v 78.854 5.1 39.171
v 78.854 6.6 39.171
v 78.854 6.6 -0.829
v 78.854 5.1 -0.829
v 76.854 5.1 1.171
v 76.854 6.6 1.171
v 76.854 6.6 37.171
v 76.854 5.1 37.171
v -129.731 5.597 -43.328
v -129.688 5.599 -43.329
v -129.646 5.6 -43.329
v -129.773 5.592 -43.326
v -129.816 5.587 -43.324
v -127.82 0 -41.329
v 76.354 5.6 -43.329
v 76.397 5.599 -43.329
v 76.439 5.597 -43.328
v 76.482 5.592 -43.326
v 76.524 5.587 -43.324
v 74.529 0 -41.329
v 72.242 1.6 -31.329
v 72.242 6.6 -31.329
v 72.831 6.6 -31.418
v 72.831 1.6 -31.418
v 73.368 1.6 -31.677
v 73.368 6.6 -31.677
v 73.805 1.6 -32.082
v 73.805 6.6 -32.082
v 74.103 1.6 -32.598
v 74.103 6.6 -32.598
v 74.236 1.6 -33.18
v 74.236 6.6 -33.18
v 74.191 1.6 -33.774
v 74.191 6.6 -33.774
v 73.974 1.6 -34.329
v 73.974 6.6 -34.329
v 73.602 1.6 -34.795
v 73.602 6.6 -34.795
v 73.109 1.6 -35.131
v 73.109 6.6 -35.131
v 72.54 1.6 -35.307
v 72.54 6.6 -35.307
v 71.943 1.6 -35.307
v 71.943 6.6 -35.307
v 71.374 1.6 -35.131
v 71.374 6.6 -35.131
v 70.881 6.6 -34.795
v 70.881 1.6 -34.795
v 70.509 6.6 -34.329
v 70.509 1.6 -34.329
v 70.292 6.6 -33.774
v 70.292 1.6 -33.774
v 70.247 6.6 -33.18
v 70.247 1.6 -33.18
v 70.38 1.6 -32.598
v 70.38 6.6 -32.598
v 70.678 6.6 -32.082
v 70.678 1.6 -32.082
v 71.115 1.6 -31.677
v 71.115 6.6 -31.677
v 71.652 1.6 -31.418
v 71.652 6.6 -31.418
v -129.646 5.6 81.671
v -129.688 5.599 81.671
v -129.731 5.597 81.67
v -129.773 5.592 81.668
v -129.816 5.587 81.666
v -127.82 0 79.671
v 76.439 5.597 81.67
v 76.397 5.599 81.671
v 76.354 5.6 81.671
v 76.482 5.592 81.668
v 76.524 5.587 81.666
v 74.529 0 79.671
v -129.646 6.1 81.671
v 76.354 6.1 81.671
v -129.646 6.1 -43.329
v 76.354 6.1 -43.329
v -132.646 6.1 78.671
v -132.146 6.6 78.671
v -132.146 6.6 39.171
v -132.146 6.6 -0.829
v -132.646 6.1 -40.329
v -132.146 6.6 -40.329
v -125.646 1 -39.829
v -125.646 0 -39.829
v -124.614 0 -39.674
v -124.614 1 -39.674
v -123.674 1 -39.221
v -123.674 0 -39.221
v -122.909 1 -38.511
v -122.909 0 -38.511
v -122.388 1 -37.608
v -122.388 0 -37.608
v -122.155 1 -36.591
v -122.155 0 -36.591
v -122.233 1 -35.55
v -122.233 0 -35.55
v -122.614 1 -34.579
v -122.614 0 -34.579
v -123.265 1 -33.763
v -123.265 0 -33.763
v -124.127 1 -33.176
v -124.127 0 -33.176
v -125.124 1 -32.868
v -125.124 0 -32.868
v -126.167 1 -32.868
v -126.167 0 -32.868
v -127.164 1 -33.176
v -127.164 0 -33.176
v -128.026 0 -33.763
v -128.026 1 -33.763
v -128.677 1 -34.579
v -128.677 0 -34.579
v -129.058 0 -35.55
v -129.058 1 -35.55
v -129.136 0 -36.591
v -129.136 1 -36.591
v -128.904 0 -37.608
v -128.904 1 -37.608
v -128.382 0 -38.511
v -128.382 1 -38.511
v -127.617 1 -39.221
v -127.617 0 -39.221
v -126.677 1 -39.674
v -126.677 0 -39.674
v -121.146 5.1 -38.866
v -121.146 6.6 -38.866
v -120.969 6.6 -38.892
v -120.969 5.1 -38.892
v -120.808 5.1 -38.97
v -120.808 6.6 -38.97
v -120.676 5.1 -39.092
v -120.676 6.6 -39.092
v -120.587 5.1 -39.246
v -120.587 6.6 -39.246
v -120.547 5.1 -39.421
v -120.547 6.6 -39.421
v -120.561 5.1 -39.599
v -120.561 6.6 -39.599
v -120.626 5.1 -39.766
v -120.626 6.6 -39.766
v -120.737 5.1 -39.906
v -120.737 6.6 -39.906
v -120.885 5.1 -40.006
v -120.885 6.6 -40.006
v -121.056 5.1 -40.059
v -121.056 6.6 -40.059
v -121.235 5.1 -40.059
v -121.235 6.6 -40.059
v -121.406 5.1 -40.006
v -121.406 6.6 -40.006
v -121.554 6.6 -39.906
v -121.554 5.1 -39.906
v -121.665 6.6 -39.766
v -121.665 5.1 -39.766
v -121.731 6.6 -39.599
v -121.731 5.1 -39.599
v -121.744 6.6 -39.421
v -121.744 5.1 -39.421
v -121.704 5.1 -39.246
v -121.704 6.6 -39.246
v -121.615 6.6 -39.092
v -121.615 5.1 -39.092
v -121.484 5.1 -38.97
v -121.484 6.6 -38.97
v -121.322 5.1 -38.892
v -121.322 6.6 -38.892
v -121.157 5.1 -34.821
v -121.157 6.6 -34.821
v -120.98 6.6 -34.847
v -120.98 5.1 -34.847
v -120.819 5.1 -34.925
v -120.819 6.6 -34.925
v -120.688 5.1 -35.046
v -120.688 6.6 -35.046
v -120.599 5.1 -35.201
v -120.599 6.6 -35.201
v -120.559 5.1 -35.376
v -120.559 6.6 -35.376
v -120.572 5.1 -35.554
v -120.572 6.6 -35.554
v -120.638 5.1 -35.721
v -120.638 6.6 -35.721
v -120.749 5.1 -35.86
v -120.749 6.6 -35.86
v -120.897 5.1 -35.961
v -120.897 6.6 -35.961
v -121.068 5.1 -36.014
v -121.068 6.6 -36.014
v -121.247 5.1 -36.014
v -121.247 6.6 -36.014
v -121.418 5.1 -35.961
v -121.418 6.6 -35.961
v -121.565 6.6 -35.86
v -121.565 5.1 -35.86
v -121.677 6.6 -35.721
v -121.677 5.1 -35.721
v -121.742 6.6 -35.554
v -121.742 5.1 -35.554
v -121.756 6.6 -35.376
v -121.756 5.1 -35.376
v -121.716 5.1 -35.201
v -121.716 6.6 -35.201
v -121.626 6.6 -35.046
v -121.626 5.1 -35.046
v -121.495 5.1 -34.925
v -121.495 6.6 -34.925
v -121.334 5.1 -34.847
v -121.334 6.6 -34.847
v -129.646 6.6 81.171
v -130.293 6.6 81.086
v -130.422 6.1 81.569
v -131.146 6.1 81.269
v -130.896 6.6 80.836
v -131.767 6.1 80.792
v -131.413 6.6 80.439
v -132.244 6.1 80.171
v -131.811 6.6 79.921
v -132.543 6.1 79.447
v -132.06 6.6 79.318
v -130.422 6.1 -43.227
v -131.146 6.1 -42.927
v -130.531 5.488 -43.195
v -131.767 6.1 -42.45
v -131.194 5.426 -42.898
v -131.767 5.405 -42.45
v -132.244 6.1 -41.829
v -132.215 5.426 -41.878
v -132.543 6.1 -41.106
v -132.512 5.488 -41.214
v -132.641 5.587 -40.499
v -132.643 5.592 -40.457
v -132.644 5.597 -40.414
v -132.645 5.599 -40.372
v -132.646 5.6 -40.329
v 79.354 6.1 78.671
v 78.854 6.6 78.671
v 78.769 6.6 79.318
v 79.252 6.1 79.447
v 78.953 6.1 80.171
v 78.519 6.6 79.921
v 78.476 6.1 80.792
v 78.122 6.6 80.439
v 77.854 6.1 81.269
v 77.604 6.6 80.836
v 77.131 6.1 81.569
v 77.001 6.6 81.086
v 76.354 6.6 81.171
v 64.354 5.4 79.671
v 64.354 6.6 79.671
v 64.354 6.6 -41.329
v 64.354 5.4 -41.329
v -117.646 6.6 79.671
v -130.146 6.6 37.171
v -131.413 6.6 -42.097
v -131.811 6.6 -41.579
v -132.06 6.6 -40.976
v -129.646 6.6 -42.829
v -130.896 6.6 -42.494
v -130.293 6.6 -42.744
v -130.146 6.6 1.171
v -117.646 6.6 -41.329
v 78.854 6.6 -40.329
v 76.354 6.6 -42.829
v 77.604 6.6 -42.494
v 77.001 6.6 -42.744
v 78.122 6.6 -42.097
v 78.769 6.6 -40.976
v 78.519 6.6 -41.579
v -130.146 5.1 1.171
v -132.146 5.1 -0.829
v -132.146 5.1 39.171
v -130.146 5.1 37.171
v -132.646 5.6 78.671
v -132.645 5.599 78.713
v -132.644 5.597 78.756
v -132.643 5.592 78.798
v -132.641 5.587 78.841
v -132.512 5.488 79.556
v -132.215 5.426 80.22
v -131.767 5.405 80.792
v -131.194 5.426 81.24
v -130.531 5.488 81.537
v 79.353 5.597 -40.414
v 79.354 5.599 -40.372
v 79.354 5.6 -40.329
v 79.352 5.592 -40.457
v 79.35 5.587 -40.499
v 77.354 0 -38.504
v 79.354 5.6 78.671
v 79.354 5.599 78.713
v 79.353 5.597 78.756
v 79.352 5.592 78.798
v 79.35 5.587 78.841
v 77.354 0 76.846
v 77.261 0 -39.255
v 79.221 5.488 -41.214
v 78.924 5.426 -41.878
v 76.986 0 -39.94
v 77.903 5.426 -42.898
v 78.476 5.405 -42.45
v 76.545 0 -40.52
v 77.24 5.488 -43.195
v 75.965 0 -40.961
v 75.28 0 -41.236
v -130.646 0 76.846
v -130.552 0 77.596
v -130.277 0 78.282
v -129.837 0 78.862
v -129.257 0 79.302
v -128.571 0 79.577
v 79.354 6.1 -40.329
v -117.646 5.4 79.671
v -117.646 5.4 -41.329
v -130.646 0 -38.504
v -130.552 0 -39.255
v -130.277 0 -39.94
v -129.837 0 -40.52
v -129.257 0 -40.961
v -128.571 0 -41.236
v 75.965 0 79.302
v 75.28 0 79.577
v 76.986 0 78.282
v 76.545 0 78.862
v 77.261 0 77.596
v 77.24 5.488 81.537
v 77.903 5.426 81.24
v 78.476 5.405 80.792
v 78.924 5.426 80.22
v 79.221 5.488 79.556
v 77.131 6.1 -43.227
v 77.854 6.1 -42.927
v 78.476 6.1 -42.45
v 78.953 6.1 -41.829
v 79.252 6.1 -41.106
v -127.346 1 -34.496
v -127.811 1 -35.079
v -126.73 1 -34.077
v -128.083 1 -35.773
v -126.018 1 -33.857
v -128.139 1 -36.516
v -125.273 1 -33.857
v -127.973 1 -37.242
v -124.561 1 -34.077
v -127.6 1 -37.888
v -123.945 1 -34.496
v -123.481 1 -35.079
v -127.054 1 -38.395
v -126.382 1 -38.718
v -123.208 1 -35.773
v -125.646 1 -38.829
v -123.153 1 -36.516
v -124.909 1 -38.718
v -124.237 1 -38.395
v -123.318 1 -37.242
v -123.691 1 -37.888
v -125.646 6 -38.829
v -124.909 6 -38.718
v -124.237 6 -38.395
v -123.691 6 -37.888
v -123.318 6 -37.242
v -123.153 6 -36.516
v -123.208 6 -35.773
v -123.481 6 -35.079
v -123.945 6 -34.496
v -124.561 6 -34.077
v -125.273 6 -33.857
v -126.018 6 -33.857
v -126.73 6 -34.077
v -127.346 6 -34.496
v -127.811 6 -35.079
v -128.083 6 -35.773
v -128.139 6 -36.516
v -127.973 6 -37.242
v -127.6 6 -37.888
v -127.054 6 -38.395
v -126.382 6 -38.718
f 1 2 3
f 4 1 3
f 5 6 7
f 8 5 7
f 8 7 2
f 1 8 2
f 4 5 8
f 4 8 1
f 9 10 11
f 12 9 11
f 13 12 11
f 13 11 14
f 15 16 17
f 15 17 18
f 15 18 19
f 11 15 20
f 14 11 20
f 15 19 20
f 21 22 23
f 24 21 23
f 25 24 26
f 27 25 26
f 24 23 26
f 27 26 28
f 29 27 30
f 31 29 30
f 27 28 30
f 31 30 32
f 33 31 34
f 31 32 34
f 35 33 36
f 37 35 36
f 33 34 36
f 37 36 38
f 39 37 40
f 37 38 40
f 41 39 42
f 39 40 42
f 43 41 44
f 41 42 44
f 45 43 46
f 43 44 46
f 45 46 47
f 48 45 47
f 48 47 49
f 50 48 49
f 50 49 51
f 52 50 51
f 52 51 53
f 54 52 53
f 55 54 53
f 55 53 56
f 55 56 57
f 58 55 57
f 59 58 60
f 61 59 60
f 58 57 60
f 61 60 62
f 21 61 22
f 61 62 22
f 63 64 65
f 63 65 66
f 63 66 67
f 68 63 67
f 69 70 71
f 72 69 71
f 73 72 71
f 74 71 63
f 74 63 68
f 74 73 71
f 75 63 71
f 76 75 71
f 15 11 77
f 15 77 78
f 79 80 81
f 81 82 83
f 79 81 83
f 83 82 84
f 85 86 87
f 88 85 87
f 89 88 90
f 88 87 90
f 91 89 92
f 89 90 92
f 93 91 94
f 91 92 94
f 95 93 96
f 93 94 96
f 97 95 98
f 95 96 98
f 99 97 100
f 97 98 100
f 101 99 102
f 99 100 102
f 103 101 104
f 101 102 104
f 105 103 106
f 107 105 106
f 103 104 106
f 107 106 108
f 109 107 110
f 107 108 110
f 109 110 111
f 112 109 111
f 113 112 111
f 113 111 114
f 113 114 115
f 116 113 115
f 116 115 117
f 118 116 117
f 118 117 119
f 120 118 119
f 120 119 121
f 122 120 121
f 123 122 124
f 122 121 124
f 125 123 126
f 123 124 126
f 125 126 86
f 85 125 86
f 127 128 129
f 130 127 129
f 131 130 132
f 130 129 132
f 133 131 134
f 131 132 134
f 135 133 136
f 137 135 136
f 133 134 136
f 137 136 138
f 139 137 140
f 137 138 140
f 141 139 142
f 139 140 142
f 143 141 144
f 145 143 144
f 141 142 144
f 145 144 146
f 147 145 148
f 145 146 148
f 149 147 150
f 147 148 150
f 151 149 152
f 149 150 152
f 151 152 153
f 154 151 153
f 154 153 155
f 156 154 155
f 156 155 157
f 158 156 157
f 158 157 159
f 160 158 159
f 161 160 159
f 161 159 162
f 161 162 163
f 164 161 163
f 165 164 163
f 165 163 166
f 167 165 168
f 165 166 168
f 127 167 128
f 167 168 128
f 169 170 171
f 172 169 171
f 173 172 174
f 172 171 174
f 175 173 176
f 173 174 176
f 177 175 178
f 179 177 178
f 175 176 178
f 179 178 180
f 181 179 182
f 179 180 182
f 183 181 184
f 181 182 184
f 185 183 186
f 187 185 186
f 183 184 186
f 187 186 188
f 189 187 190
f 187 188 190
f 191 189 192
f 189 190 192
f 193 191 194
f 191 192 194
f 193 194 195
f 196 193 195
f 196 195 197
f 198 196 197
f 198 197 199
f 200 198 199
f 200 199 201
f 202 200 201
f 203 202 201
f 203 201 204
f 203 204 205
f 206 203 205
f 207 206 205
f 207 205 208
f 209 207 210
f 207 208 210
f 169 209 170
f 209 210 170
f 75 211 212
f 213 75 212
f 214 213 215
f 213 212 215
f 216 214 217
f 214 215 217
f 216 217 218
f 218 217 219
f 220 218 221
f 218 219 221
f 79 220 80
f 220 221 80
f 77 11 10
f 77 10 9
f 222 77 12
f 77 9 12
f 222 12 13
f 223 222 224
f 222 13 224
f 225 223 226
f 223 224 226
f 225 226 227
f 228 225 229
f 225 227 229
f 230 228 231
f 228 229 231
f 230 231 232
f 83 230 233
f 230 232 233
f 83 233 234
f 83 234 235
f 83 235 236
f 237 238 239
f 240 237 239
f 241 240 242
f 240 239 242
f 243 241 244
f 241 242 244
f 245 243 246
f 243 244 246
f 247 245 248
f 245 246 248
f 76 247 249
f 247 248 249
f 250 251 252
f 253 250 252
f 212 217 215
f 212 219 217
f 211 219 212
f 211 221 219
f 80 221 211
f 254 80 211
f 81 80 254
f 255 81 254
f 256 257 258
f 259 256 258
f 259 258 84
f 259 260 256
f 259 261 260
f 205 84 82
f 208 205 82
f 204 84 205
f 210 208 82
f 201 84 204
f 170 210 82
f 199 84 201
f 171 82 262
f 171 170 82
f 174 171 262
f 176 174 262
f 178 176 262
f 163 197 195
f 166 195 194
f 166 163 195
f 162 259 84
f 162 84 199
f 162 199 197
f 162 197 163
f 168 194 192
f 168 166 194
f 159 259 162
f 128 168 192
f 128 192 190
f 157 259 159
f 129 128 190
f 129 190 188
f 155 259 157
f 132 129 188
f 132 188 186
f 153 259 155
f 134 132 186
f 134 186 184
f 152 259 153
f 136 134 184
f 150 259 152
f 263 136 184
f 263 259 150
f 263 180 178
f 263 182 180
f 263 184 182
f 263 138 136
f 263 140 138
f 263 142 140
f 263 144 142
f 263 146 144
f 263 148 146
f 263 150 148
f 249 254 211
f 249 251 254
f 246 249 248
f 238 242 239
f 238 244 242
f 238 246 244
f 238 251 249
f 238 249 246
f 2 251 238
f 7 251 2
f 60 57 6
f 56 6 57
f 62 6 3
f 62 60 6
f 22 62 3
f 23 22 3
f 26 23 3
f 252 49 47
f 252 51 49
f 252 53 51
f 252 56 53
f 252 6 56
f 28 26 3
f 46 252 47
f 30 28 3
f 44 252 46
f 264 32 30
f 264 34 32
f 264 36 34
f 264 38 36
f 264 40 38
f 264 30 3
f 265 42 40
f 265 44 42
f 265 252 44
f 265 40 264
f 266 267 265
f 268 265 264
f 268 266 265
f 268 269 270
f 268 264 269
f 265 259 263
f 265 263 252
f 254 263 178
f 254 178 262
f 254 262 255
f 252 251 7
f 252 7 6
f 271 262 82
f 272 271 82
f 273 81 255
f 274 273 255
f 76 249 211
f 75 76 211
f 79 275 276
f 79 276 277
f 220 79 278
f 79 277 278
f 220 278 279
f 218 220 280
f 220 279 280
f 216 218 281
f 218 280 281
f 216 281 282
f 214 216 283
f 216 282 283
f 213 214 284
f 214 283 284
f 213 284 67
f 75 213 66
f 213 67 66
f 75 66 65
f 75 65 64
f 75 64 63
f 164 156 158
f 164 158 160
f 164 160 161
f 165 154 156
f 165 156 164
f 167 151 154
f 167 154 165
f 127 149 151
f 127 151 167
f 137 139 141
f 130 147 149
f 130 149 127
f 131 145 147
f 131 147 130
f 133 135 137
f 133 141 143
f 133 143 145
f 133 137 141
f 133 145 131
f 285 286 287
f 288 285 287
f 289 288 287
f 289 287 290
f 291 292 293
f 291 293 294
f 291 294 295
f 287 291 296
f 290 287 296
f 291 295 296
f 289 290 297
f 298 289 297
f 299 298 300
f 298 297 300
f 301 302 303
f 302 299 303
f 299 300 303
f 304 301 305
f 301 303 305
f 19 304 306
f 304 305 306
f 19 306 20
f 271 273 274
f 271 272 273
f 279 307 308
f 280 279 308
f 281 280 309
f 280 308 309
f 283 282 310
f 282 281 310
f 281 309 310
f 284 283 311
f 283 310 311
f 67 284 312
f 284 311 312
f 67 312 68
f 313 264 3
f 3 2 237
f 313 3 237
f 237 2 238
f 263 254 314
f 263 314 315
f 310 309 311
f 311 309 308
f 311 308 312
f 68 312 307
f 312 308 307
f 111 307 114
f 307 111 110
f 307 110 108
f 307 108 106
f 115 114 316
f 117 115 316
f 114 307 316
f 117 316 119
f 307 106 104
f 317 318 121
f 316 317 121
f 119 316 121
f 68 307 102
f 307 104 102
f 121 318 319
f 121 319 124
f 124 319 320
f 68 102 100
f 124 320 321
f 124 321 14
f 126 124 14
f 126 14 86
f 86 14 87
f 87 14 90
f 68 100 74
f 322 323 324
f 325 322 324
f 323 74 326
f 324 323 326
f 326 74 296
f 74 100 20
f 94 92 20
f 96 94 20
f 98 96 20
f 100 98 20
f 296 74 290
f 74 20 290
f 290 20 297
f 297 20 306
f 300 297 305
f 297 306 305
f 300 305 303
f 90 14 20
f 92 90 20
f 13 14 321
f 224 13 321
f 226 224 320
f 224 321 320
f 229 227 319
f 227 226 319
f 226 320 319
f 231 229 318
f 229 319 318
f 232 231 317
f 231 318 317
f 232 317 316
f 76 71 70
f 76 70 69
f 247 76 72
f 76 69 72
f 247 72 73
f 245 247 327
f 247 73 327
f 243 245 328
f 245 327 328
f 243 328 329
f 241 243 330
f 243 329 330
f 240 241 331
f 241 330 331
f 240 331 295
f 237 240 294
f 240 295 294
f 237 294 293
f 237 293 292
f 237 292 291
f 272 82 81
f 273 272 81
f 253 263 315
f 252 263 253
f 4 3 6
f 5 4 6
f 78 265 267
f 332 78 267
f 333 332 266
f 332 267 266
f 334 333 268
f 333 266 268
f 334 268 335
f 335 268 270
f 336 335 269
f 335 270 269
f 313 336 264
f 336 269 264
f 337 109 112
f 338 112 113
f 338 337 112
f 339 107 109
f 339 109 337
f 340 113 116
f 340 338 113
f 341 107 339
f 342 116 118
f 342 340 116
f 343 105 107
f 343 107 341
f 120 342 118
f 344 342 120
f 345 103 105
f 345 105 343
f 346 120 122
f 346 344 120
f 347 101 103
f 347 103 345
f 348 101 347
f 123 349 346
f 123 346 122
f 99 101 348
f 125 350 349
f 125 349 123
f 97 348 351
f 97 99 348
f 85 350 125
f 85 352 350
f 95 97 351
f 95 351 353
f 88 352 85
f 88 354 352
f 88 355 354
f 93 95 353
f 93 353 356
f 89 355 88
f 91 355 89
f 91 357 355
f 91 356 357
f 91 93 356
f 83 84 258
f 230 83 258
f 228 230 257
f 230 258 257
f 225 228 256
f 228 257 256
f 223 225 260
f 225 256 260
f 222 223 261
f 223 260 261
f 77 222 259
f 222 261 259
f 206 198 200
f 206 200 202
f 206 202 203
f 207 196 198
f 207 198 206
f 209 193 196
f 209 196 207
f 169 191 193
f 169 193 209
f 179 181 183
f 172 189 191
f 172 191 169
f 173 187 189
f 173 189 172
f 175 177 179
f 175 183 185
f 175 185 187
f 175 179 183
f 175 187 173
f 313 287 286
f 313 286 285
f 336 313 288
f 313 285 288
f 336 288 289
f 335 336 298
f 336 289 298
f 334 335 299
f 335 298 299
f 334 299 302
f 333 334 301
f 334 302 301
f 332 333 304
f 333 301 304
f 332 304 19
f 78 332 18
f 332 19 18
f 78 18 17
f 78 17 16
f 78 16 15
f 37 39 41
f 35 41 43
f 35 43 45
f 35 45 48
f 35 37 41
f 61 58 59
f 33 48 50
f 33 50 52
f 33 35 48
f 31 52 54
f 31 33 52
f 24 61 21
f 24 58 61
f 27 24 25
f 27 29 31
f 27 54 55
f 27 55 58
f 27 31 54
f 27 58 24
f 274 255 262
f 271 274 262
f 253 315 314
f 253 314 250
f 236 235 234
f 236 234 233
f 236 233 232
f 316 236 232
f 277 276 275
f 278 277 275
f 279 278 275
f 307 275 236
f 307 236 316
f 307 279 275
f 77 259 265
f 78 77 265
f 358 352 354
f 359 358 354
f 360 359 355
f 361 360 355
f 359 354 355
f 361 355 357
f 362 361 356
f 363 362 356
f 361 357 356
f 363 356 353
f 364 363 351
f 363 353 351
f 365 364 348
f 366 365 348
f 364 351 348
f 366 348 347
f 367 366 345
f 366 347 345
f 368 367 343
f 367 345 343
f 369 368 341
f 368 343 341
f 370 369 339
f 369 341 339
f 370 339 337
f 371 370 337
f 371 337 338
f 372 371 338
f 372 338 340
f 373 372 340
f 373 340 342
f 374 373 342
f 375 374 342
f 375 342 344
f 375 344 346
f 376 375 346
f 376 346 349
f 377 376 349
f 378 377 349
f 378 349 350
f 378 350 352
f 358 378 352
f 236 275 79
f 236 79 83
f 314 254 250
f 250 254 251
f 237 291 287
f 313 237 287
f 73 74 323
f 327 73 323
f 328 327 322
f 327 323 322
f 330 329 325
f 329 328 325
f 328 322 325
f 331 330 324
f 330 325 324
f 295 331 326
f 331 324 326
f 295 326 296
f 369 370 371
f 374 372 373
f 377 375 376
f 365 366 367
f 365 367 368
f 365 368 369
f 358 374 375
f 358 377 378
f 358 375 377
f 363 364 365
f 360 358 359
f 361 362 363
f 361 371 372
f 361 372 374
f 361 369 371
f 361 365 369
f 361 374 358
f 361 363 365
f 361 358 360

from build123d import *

# Parameters (mm, degrees)
SKETCH1_W           = 212
SKETCH1_H           = 125
BOSS_EXTRUDE1_DEPTH = 6.6
SKETCH2_W           = 182
SKETCH2_H           = 121
CUT_EXTRUDE1_DEPTH  = 1.2
CUT_EXTRUDE2_DEPTH  = 131.2
CUT_EXTRUDE3_DEPTH  = 131.2
CUT_EXTRUDE4_DEPTH  = 221.2
CUT_EXTRUDE5_DEPTH  = 221.2
FILLET1_R           = 3
SKETCH7_R           = 2.5
CUT_EXTRUDE6_DEPTH  = 6
SKETCH8_R           = 3.5
CUT_EXTRUDE7_DEPTH  = 1
SKETCH9_R           = 2
CUT_EXTRUDE8_DEPTH  = 5
SKETCH10_R          = 0.6
CUT_EXTRUDE9_DEPTH  = 1.5
CHAMFER1_SIZE       = 0.5
CUT_EXTRUDE10_DEPTH = 1.5
CUT_EXTRUDE11_DEPTH = 1.5


with BuildPart() as part:
    # Sketch1 → Boss-Extrude1 (new body)
    with BuildSketch(Plane(origin=(0, 0, 0), x_dir=(1, 0, 0), z_dir=(0, 1, 0))):
        with Locations((-26.64556962, -19.170886076)):
            Rectangle(SKETCH1_W, SKETCH1_H)
    extrude(amount=BOSS_EXTRUDE1_DEPTH)

    # Sketch2 → Cut-Extrude1 (cut)
    with BuildSketch(Plane(origin=(0, 6.6, 0), x_dir=(1, 0, 0), z_dir=(0, 1, 0))):
        with Locations((-26.64556962, -19.170886076)):
            Rectangle(SKETCH2_W, SKETCH2_H)
    extrude(amount=-CUT_EXTRUDE1_DEPTH, mode=Mode.SUBTRACT)

    # Sketch3 → Cut-Extrude2 (cut)
    with BuildSketch(Plane.XY.offset(81.670886076)):
        Polygon((-132.64556962, 5.6), (-130.64556962, 0), (-132.64556962, 0), align=None)
    extrude(amount=-CUT_EXTRUDE2_DEPTH, mode=Mode.SUBTRACT)

    # Sketch4 → Cut-Extrude3 (cut)
    with BuildSketch(Plane.XY.offset(81.670886076)):
        Polygon((79.35443038, 5.6), (77.35443038, 0), (79.35443038, 0), align=None)
    extrude(amount=-CUT_EXTRUDE3_DEPTH, mode=Mode.SUBTRACT)

    # Sketch5 → Cut-Extrude4 (cut)
    with BuildSketch(Plane(origin=(79.35443038, 0, 0), x_dir=(0, 0, -1), z_dir=(1, 0, 0))):
        Polygon((-81.670886076, 5.6), (-79.670886076, 0), (-81.670886076, 0), align=None)
    extrude(amount=-CUT_EXTRUDE4_DEPTH, mode=Mode.SUBTRACT)

    # Sketch6 → Cut-Extrude5 (cut)
    with BuildSketch(Plane(origin=(79.35443038, 0, 0), x_dir=(0, 0, -1), z_dir=(1, 0, 0))):
        Polygon((43.329113924, 5.6), (41.329113924, 0), (43.329113924, 0), align=None)
    extrude(amount=-CUT_EXTRUDE5_DEPTH, mode=Mode.SUBTRACT)

    # Fillet1
    # the kernel refuses this fillet: 3 mm, written as the material it takes off along each edge
    with BuildSketch(Plane(origin=(75.220284038, -5.975609756, 77.536739734), x_dir=(0.1072201272408216, 0.30021635627431204, -0.9478259248088952), z_dir=(0.3187883565316692, 0.8926073982886735, 0.31878835653166915)), Plane(origin=(75.220284038, -5.975609756, -39.194967583), x_dir=(-0.9478259248088952, 0.30021635627431126, -0.10722012724082396), z_dir=(0.31878835653166926, 0.892607398288674, -0.3187883565316682))) as fillet1_piece_1:
        with BuildLine():
            CenterArc((FILLET1_R * 0.892607398289, FILLET1_R), FILLET1_R, 186.495326626, 83.504673374)
            Line((-FILLET1_R * 0.100973687589, FILLET1_R * 0.886877828054), (0, 0))
            Line((0, 0), (FILLET1_R * 0.892607398289, 0))
        make_face()
    extrude(amount=19.662865831, mode=Mode.SUBTRACT)
    with BuildSketch(Plane(origin=(-128.511423279, -5.975609756, 77.536739734), x_dir=(-0.10722012724082589, 0.30021635627431054, -0.947825924808895), z_dir=(-0.3187883565316692, 0.8926073982886735, 0.31878835653166926)), Plane(origin=(-128.511423279, -5.975609756, -39.194967583), x_dir=(0.9478259248088952, 0.30021635627431037, -0.10722012724082654), z_dir=(-0.31878835653166926, 0.892607398288674, -0.3187883565316681))) as fillet1_piece_2:
        with BuildLine():
            CenterArc((FILLET1_R * 0.892607398289, -FILLET1_R), FILLET1_R, 90, 83.504673374)
            Line((-FILLET1_R * 0.100973687589, -FILLET1_R * 0.886877828054), (0, 0))
            Line((0, 0), (FILLET1_R * 0.892607398289, 0))
        make_face()
    extrude(amount=19.662865831, mode=Mode.SUBTRACT)
    with BuildSketch(Plane(origin=(-132.64556962, -1.9, -43.329113924), x_dir=(1, 0, 0), z_dir=(0, 1, 0)), Plane(origin=(-132.64556962, -1.9, 81.670886076), x_dir=(0, 0, -1), z_dir=(0, 1, 0))) as fillet1_piece_3:
        with BuildLine():
            CenterArc((FILLET1_R, -FILLET1_R), FILLET1_R, 90, 90)
            Line((0, -FILLET1_R), (0, 0))
            Line((0, 0), (FILLET1_R, 0))
        make_face()
    extrude(amount=16, mode=Mode.SUBTRACT)
    with BuildSketch(Plane(origin=(79.35443038, -1.9, -43.329113924), x_dir=(-1, 0, 0), z_dir=(0, 1, 0)), Plane(origin=(79.35443038, -1.9, 81.670886076), x_dir=(0, 0, -1), z_dir=(0, 1, 0))) as fillet1_piece_4:
        with BuildLine():
            CenterArc((FILLET1_R, FILLET1_R), FILLET1_R, 180, 90)
            Line((0, FILLET1_R), (0, 0))
            Line((0, 0), (FILLET1_R, 0))
        make_face()
    extrude(amount=16, mode=Mode.SUBTRACT)

    # Sketch7 → Cut-Extrude6 (cut)
    with BuildSketch(Plane.XZ):
        with Locations(Location((-125.64556962, -36.329113924, 0), (0, 0, 270))):
            Circle(SKETCH7_R)
    extrude(amount=-CUT_EXTRUDE6_DEPTH, mode=Mode.SUBTRACT)

    # Sketch8 → Cut-Extrude7 (cut)
    with BuildSketch(Plane.XZ):
        with Locations(Location((-125.64556962, -36.329113924, 0), (0, 0, 270))):
            Circle(SKETCH8_R)
    extrude(amount=-CUT_EXTRUDE7_DEPTH, mode=Mode.SUBTRACT)

    # Sketch9 → Cut-Extrude8 (cut)
    with BuildSketch(Plane(origin=(0, 6.6, 0), x_dir=(1, 0, 0), z_dir=(0, 1, 0))):
        with Locations(Location((72.241534247, 33.329113924, 0), (0, 0, 270))):
            Circle(SKETCH9_R)
    extrude(amount=-CUT_EXTRUDE8_DEPTH, mode=Mode.SUBTRACT)

    # Sketch10 → Cut-Extrude9 (cut)
    with BuildSketch(Plane(origin=(0, 6.6, 0), x_dir=(1, 0, 0), z_dir=(0, 1, 0))):
        with Locations(Location((-121.14556962, 39.465683386, 0), (0, 0, 270))):
            Circle(SKETCH10_R)
        with Locations(Location((-121.157311089, 35.420585215, 0), (0, 0, 270))):
            Circle(SKETCH10_R)
    extrude(amount=-CUT_EXTRUDE9_DEPTH, mode=Mode.SUBTRACT)

    # Chamfer1
    chamfer1_edges = [part.edges().sort_by_distance(p)[0] for p in [
        (-132.64556962, 6.6, 19.170886076),
        (-26.64556962, 6.6, -43.329113924),
        (-26.64556962, 6.6, 81.670886076),
        (79.35443038, 6.6, 19.170886076),
        (78.475750723, 6.6, -42.450434268),
        (78.475750723, 6.6, 80.79220642),
        (-131.766889964, 6.6, 80.79220642),
        (-131.766889964, 6.6, -42.450434268),
    ]]
    chamfer(chamfer1_edges, length=CHAMFER1_SIZE)

    # Sketch11 → Cut-Extrude10 (cut)
    with BuildSketch(Plane(origin=(0, 6.6, 0), x_dir=(1, 0, 0), z_dir=(0, 1, 0))):
        Polygon((-132.14556962, -19.170886076), (-132.14556962, -39.170886076), (-130.14556962, -37.170886076), (-130.14556962, -1.170886076), (-132.14556962, 0.829113924), align=None)
    extrude(amount=-CUT_EXTRUDE10_DEPTH, mode=Mode.SUBTRACT)

    # Sketch12 → Cut-Extrude11 (cut)
    with BuildSketch(Plane(origin=(0, 6.6, 0), x_dir=(1, 0, 0), z_dir=(0, 1, 0))):
        Polygon((78.85443038, -19.170886076), (78.85443038, 0.829113924), (76.85443038, -1.170886076), (76.85443038, -37.170886076), (78.85443038, -39.170886076), align=None)
    extrude(amount=-CUT_EXTRUDE11_DEPTH, mode=Mode.SUBTRACT)


solid = part.part
